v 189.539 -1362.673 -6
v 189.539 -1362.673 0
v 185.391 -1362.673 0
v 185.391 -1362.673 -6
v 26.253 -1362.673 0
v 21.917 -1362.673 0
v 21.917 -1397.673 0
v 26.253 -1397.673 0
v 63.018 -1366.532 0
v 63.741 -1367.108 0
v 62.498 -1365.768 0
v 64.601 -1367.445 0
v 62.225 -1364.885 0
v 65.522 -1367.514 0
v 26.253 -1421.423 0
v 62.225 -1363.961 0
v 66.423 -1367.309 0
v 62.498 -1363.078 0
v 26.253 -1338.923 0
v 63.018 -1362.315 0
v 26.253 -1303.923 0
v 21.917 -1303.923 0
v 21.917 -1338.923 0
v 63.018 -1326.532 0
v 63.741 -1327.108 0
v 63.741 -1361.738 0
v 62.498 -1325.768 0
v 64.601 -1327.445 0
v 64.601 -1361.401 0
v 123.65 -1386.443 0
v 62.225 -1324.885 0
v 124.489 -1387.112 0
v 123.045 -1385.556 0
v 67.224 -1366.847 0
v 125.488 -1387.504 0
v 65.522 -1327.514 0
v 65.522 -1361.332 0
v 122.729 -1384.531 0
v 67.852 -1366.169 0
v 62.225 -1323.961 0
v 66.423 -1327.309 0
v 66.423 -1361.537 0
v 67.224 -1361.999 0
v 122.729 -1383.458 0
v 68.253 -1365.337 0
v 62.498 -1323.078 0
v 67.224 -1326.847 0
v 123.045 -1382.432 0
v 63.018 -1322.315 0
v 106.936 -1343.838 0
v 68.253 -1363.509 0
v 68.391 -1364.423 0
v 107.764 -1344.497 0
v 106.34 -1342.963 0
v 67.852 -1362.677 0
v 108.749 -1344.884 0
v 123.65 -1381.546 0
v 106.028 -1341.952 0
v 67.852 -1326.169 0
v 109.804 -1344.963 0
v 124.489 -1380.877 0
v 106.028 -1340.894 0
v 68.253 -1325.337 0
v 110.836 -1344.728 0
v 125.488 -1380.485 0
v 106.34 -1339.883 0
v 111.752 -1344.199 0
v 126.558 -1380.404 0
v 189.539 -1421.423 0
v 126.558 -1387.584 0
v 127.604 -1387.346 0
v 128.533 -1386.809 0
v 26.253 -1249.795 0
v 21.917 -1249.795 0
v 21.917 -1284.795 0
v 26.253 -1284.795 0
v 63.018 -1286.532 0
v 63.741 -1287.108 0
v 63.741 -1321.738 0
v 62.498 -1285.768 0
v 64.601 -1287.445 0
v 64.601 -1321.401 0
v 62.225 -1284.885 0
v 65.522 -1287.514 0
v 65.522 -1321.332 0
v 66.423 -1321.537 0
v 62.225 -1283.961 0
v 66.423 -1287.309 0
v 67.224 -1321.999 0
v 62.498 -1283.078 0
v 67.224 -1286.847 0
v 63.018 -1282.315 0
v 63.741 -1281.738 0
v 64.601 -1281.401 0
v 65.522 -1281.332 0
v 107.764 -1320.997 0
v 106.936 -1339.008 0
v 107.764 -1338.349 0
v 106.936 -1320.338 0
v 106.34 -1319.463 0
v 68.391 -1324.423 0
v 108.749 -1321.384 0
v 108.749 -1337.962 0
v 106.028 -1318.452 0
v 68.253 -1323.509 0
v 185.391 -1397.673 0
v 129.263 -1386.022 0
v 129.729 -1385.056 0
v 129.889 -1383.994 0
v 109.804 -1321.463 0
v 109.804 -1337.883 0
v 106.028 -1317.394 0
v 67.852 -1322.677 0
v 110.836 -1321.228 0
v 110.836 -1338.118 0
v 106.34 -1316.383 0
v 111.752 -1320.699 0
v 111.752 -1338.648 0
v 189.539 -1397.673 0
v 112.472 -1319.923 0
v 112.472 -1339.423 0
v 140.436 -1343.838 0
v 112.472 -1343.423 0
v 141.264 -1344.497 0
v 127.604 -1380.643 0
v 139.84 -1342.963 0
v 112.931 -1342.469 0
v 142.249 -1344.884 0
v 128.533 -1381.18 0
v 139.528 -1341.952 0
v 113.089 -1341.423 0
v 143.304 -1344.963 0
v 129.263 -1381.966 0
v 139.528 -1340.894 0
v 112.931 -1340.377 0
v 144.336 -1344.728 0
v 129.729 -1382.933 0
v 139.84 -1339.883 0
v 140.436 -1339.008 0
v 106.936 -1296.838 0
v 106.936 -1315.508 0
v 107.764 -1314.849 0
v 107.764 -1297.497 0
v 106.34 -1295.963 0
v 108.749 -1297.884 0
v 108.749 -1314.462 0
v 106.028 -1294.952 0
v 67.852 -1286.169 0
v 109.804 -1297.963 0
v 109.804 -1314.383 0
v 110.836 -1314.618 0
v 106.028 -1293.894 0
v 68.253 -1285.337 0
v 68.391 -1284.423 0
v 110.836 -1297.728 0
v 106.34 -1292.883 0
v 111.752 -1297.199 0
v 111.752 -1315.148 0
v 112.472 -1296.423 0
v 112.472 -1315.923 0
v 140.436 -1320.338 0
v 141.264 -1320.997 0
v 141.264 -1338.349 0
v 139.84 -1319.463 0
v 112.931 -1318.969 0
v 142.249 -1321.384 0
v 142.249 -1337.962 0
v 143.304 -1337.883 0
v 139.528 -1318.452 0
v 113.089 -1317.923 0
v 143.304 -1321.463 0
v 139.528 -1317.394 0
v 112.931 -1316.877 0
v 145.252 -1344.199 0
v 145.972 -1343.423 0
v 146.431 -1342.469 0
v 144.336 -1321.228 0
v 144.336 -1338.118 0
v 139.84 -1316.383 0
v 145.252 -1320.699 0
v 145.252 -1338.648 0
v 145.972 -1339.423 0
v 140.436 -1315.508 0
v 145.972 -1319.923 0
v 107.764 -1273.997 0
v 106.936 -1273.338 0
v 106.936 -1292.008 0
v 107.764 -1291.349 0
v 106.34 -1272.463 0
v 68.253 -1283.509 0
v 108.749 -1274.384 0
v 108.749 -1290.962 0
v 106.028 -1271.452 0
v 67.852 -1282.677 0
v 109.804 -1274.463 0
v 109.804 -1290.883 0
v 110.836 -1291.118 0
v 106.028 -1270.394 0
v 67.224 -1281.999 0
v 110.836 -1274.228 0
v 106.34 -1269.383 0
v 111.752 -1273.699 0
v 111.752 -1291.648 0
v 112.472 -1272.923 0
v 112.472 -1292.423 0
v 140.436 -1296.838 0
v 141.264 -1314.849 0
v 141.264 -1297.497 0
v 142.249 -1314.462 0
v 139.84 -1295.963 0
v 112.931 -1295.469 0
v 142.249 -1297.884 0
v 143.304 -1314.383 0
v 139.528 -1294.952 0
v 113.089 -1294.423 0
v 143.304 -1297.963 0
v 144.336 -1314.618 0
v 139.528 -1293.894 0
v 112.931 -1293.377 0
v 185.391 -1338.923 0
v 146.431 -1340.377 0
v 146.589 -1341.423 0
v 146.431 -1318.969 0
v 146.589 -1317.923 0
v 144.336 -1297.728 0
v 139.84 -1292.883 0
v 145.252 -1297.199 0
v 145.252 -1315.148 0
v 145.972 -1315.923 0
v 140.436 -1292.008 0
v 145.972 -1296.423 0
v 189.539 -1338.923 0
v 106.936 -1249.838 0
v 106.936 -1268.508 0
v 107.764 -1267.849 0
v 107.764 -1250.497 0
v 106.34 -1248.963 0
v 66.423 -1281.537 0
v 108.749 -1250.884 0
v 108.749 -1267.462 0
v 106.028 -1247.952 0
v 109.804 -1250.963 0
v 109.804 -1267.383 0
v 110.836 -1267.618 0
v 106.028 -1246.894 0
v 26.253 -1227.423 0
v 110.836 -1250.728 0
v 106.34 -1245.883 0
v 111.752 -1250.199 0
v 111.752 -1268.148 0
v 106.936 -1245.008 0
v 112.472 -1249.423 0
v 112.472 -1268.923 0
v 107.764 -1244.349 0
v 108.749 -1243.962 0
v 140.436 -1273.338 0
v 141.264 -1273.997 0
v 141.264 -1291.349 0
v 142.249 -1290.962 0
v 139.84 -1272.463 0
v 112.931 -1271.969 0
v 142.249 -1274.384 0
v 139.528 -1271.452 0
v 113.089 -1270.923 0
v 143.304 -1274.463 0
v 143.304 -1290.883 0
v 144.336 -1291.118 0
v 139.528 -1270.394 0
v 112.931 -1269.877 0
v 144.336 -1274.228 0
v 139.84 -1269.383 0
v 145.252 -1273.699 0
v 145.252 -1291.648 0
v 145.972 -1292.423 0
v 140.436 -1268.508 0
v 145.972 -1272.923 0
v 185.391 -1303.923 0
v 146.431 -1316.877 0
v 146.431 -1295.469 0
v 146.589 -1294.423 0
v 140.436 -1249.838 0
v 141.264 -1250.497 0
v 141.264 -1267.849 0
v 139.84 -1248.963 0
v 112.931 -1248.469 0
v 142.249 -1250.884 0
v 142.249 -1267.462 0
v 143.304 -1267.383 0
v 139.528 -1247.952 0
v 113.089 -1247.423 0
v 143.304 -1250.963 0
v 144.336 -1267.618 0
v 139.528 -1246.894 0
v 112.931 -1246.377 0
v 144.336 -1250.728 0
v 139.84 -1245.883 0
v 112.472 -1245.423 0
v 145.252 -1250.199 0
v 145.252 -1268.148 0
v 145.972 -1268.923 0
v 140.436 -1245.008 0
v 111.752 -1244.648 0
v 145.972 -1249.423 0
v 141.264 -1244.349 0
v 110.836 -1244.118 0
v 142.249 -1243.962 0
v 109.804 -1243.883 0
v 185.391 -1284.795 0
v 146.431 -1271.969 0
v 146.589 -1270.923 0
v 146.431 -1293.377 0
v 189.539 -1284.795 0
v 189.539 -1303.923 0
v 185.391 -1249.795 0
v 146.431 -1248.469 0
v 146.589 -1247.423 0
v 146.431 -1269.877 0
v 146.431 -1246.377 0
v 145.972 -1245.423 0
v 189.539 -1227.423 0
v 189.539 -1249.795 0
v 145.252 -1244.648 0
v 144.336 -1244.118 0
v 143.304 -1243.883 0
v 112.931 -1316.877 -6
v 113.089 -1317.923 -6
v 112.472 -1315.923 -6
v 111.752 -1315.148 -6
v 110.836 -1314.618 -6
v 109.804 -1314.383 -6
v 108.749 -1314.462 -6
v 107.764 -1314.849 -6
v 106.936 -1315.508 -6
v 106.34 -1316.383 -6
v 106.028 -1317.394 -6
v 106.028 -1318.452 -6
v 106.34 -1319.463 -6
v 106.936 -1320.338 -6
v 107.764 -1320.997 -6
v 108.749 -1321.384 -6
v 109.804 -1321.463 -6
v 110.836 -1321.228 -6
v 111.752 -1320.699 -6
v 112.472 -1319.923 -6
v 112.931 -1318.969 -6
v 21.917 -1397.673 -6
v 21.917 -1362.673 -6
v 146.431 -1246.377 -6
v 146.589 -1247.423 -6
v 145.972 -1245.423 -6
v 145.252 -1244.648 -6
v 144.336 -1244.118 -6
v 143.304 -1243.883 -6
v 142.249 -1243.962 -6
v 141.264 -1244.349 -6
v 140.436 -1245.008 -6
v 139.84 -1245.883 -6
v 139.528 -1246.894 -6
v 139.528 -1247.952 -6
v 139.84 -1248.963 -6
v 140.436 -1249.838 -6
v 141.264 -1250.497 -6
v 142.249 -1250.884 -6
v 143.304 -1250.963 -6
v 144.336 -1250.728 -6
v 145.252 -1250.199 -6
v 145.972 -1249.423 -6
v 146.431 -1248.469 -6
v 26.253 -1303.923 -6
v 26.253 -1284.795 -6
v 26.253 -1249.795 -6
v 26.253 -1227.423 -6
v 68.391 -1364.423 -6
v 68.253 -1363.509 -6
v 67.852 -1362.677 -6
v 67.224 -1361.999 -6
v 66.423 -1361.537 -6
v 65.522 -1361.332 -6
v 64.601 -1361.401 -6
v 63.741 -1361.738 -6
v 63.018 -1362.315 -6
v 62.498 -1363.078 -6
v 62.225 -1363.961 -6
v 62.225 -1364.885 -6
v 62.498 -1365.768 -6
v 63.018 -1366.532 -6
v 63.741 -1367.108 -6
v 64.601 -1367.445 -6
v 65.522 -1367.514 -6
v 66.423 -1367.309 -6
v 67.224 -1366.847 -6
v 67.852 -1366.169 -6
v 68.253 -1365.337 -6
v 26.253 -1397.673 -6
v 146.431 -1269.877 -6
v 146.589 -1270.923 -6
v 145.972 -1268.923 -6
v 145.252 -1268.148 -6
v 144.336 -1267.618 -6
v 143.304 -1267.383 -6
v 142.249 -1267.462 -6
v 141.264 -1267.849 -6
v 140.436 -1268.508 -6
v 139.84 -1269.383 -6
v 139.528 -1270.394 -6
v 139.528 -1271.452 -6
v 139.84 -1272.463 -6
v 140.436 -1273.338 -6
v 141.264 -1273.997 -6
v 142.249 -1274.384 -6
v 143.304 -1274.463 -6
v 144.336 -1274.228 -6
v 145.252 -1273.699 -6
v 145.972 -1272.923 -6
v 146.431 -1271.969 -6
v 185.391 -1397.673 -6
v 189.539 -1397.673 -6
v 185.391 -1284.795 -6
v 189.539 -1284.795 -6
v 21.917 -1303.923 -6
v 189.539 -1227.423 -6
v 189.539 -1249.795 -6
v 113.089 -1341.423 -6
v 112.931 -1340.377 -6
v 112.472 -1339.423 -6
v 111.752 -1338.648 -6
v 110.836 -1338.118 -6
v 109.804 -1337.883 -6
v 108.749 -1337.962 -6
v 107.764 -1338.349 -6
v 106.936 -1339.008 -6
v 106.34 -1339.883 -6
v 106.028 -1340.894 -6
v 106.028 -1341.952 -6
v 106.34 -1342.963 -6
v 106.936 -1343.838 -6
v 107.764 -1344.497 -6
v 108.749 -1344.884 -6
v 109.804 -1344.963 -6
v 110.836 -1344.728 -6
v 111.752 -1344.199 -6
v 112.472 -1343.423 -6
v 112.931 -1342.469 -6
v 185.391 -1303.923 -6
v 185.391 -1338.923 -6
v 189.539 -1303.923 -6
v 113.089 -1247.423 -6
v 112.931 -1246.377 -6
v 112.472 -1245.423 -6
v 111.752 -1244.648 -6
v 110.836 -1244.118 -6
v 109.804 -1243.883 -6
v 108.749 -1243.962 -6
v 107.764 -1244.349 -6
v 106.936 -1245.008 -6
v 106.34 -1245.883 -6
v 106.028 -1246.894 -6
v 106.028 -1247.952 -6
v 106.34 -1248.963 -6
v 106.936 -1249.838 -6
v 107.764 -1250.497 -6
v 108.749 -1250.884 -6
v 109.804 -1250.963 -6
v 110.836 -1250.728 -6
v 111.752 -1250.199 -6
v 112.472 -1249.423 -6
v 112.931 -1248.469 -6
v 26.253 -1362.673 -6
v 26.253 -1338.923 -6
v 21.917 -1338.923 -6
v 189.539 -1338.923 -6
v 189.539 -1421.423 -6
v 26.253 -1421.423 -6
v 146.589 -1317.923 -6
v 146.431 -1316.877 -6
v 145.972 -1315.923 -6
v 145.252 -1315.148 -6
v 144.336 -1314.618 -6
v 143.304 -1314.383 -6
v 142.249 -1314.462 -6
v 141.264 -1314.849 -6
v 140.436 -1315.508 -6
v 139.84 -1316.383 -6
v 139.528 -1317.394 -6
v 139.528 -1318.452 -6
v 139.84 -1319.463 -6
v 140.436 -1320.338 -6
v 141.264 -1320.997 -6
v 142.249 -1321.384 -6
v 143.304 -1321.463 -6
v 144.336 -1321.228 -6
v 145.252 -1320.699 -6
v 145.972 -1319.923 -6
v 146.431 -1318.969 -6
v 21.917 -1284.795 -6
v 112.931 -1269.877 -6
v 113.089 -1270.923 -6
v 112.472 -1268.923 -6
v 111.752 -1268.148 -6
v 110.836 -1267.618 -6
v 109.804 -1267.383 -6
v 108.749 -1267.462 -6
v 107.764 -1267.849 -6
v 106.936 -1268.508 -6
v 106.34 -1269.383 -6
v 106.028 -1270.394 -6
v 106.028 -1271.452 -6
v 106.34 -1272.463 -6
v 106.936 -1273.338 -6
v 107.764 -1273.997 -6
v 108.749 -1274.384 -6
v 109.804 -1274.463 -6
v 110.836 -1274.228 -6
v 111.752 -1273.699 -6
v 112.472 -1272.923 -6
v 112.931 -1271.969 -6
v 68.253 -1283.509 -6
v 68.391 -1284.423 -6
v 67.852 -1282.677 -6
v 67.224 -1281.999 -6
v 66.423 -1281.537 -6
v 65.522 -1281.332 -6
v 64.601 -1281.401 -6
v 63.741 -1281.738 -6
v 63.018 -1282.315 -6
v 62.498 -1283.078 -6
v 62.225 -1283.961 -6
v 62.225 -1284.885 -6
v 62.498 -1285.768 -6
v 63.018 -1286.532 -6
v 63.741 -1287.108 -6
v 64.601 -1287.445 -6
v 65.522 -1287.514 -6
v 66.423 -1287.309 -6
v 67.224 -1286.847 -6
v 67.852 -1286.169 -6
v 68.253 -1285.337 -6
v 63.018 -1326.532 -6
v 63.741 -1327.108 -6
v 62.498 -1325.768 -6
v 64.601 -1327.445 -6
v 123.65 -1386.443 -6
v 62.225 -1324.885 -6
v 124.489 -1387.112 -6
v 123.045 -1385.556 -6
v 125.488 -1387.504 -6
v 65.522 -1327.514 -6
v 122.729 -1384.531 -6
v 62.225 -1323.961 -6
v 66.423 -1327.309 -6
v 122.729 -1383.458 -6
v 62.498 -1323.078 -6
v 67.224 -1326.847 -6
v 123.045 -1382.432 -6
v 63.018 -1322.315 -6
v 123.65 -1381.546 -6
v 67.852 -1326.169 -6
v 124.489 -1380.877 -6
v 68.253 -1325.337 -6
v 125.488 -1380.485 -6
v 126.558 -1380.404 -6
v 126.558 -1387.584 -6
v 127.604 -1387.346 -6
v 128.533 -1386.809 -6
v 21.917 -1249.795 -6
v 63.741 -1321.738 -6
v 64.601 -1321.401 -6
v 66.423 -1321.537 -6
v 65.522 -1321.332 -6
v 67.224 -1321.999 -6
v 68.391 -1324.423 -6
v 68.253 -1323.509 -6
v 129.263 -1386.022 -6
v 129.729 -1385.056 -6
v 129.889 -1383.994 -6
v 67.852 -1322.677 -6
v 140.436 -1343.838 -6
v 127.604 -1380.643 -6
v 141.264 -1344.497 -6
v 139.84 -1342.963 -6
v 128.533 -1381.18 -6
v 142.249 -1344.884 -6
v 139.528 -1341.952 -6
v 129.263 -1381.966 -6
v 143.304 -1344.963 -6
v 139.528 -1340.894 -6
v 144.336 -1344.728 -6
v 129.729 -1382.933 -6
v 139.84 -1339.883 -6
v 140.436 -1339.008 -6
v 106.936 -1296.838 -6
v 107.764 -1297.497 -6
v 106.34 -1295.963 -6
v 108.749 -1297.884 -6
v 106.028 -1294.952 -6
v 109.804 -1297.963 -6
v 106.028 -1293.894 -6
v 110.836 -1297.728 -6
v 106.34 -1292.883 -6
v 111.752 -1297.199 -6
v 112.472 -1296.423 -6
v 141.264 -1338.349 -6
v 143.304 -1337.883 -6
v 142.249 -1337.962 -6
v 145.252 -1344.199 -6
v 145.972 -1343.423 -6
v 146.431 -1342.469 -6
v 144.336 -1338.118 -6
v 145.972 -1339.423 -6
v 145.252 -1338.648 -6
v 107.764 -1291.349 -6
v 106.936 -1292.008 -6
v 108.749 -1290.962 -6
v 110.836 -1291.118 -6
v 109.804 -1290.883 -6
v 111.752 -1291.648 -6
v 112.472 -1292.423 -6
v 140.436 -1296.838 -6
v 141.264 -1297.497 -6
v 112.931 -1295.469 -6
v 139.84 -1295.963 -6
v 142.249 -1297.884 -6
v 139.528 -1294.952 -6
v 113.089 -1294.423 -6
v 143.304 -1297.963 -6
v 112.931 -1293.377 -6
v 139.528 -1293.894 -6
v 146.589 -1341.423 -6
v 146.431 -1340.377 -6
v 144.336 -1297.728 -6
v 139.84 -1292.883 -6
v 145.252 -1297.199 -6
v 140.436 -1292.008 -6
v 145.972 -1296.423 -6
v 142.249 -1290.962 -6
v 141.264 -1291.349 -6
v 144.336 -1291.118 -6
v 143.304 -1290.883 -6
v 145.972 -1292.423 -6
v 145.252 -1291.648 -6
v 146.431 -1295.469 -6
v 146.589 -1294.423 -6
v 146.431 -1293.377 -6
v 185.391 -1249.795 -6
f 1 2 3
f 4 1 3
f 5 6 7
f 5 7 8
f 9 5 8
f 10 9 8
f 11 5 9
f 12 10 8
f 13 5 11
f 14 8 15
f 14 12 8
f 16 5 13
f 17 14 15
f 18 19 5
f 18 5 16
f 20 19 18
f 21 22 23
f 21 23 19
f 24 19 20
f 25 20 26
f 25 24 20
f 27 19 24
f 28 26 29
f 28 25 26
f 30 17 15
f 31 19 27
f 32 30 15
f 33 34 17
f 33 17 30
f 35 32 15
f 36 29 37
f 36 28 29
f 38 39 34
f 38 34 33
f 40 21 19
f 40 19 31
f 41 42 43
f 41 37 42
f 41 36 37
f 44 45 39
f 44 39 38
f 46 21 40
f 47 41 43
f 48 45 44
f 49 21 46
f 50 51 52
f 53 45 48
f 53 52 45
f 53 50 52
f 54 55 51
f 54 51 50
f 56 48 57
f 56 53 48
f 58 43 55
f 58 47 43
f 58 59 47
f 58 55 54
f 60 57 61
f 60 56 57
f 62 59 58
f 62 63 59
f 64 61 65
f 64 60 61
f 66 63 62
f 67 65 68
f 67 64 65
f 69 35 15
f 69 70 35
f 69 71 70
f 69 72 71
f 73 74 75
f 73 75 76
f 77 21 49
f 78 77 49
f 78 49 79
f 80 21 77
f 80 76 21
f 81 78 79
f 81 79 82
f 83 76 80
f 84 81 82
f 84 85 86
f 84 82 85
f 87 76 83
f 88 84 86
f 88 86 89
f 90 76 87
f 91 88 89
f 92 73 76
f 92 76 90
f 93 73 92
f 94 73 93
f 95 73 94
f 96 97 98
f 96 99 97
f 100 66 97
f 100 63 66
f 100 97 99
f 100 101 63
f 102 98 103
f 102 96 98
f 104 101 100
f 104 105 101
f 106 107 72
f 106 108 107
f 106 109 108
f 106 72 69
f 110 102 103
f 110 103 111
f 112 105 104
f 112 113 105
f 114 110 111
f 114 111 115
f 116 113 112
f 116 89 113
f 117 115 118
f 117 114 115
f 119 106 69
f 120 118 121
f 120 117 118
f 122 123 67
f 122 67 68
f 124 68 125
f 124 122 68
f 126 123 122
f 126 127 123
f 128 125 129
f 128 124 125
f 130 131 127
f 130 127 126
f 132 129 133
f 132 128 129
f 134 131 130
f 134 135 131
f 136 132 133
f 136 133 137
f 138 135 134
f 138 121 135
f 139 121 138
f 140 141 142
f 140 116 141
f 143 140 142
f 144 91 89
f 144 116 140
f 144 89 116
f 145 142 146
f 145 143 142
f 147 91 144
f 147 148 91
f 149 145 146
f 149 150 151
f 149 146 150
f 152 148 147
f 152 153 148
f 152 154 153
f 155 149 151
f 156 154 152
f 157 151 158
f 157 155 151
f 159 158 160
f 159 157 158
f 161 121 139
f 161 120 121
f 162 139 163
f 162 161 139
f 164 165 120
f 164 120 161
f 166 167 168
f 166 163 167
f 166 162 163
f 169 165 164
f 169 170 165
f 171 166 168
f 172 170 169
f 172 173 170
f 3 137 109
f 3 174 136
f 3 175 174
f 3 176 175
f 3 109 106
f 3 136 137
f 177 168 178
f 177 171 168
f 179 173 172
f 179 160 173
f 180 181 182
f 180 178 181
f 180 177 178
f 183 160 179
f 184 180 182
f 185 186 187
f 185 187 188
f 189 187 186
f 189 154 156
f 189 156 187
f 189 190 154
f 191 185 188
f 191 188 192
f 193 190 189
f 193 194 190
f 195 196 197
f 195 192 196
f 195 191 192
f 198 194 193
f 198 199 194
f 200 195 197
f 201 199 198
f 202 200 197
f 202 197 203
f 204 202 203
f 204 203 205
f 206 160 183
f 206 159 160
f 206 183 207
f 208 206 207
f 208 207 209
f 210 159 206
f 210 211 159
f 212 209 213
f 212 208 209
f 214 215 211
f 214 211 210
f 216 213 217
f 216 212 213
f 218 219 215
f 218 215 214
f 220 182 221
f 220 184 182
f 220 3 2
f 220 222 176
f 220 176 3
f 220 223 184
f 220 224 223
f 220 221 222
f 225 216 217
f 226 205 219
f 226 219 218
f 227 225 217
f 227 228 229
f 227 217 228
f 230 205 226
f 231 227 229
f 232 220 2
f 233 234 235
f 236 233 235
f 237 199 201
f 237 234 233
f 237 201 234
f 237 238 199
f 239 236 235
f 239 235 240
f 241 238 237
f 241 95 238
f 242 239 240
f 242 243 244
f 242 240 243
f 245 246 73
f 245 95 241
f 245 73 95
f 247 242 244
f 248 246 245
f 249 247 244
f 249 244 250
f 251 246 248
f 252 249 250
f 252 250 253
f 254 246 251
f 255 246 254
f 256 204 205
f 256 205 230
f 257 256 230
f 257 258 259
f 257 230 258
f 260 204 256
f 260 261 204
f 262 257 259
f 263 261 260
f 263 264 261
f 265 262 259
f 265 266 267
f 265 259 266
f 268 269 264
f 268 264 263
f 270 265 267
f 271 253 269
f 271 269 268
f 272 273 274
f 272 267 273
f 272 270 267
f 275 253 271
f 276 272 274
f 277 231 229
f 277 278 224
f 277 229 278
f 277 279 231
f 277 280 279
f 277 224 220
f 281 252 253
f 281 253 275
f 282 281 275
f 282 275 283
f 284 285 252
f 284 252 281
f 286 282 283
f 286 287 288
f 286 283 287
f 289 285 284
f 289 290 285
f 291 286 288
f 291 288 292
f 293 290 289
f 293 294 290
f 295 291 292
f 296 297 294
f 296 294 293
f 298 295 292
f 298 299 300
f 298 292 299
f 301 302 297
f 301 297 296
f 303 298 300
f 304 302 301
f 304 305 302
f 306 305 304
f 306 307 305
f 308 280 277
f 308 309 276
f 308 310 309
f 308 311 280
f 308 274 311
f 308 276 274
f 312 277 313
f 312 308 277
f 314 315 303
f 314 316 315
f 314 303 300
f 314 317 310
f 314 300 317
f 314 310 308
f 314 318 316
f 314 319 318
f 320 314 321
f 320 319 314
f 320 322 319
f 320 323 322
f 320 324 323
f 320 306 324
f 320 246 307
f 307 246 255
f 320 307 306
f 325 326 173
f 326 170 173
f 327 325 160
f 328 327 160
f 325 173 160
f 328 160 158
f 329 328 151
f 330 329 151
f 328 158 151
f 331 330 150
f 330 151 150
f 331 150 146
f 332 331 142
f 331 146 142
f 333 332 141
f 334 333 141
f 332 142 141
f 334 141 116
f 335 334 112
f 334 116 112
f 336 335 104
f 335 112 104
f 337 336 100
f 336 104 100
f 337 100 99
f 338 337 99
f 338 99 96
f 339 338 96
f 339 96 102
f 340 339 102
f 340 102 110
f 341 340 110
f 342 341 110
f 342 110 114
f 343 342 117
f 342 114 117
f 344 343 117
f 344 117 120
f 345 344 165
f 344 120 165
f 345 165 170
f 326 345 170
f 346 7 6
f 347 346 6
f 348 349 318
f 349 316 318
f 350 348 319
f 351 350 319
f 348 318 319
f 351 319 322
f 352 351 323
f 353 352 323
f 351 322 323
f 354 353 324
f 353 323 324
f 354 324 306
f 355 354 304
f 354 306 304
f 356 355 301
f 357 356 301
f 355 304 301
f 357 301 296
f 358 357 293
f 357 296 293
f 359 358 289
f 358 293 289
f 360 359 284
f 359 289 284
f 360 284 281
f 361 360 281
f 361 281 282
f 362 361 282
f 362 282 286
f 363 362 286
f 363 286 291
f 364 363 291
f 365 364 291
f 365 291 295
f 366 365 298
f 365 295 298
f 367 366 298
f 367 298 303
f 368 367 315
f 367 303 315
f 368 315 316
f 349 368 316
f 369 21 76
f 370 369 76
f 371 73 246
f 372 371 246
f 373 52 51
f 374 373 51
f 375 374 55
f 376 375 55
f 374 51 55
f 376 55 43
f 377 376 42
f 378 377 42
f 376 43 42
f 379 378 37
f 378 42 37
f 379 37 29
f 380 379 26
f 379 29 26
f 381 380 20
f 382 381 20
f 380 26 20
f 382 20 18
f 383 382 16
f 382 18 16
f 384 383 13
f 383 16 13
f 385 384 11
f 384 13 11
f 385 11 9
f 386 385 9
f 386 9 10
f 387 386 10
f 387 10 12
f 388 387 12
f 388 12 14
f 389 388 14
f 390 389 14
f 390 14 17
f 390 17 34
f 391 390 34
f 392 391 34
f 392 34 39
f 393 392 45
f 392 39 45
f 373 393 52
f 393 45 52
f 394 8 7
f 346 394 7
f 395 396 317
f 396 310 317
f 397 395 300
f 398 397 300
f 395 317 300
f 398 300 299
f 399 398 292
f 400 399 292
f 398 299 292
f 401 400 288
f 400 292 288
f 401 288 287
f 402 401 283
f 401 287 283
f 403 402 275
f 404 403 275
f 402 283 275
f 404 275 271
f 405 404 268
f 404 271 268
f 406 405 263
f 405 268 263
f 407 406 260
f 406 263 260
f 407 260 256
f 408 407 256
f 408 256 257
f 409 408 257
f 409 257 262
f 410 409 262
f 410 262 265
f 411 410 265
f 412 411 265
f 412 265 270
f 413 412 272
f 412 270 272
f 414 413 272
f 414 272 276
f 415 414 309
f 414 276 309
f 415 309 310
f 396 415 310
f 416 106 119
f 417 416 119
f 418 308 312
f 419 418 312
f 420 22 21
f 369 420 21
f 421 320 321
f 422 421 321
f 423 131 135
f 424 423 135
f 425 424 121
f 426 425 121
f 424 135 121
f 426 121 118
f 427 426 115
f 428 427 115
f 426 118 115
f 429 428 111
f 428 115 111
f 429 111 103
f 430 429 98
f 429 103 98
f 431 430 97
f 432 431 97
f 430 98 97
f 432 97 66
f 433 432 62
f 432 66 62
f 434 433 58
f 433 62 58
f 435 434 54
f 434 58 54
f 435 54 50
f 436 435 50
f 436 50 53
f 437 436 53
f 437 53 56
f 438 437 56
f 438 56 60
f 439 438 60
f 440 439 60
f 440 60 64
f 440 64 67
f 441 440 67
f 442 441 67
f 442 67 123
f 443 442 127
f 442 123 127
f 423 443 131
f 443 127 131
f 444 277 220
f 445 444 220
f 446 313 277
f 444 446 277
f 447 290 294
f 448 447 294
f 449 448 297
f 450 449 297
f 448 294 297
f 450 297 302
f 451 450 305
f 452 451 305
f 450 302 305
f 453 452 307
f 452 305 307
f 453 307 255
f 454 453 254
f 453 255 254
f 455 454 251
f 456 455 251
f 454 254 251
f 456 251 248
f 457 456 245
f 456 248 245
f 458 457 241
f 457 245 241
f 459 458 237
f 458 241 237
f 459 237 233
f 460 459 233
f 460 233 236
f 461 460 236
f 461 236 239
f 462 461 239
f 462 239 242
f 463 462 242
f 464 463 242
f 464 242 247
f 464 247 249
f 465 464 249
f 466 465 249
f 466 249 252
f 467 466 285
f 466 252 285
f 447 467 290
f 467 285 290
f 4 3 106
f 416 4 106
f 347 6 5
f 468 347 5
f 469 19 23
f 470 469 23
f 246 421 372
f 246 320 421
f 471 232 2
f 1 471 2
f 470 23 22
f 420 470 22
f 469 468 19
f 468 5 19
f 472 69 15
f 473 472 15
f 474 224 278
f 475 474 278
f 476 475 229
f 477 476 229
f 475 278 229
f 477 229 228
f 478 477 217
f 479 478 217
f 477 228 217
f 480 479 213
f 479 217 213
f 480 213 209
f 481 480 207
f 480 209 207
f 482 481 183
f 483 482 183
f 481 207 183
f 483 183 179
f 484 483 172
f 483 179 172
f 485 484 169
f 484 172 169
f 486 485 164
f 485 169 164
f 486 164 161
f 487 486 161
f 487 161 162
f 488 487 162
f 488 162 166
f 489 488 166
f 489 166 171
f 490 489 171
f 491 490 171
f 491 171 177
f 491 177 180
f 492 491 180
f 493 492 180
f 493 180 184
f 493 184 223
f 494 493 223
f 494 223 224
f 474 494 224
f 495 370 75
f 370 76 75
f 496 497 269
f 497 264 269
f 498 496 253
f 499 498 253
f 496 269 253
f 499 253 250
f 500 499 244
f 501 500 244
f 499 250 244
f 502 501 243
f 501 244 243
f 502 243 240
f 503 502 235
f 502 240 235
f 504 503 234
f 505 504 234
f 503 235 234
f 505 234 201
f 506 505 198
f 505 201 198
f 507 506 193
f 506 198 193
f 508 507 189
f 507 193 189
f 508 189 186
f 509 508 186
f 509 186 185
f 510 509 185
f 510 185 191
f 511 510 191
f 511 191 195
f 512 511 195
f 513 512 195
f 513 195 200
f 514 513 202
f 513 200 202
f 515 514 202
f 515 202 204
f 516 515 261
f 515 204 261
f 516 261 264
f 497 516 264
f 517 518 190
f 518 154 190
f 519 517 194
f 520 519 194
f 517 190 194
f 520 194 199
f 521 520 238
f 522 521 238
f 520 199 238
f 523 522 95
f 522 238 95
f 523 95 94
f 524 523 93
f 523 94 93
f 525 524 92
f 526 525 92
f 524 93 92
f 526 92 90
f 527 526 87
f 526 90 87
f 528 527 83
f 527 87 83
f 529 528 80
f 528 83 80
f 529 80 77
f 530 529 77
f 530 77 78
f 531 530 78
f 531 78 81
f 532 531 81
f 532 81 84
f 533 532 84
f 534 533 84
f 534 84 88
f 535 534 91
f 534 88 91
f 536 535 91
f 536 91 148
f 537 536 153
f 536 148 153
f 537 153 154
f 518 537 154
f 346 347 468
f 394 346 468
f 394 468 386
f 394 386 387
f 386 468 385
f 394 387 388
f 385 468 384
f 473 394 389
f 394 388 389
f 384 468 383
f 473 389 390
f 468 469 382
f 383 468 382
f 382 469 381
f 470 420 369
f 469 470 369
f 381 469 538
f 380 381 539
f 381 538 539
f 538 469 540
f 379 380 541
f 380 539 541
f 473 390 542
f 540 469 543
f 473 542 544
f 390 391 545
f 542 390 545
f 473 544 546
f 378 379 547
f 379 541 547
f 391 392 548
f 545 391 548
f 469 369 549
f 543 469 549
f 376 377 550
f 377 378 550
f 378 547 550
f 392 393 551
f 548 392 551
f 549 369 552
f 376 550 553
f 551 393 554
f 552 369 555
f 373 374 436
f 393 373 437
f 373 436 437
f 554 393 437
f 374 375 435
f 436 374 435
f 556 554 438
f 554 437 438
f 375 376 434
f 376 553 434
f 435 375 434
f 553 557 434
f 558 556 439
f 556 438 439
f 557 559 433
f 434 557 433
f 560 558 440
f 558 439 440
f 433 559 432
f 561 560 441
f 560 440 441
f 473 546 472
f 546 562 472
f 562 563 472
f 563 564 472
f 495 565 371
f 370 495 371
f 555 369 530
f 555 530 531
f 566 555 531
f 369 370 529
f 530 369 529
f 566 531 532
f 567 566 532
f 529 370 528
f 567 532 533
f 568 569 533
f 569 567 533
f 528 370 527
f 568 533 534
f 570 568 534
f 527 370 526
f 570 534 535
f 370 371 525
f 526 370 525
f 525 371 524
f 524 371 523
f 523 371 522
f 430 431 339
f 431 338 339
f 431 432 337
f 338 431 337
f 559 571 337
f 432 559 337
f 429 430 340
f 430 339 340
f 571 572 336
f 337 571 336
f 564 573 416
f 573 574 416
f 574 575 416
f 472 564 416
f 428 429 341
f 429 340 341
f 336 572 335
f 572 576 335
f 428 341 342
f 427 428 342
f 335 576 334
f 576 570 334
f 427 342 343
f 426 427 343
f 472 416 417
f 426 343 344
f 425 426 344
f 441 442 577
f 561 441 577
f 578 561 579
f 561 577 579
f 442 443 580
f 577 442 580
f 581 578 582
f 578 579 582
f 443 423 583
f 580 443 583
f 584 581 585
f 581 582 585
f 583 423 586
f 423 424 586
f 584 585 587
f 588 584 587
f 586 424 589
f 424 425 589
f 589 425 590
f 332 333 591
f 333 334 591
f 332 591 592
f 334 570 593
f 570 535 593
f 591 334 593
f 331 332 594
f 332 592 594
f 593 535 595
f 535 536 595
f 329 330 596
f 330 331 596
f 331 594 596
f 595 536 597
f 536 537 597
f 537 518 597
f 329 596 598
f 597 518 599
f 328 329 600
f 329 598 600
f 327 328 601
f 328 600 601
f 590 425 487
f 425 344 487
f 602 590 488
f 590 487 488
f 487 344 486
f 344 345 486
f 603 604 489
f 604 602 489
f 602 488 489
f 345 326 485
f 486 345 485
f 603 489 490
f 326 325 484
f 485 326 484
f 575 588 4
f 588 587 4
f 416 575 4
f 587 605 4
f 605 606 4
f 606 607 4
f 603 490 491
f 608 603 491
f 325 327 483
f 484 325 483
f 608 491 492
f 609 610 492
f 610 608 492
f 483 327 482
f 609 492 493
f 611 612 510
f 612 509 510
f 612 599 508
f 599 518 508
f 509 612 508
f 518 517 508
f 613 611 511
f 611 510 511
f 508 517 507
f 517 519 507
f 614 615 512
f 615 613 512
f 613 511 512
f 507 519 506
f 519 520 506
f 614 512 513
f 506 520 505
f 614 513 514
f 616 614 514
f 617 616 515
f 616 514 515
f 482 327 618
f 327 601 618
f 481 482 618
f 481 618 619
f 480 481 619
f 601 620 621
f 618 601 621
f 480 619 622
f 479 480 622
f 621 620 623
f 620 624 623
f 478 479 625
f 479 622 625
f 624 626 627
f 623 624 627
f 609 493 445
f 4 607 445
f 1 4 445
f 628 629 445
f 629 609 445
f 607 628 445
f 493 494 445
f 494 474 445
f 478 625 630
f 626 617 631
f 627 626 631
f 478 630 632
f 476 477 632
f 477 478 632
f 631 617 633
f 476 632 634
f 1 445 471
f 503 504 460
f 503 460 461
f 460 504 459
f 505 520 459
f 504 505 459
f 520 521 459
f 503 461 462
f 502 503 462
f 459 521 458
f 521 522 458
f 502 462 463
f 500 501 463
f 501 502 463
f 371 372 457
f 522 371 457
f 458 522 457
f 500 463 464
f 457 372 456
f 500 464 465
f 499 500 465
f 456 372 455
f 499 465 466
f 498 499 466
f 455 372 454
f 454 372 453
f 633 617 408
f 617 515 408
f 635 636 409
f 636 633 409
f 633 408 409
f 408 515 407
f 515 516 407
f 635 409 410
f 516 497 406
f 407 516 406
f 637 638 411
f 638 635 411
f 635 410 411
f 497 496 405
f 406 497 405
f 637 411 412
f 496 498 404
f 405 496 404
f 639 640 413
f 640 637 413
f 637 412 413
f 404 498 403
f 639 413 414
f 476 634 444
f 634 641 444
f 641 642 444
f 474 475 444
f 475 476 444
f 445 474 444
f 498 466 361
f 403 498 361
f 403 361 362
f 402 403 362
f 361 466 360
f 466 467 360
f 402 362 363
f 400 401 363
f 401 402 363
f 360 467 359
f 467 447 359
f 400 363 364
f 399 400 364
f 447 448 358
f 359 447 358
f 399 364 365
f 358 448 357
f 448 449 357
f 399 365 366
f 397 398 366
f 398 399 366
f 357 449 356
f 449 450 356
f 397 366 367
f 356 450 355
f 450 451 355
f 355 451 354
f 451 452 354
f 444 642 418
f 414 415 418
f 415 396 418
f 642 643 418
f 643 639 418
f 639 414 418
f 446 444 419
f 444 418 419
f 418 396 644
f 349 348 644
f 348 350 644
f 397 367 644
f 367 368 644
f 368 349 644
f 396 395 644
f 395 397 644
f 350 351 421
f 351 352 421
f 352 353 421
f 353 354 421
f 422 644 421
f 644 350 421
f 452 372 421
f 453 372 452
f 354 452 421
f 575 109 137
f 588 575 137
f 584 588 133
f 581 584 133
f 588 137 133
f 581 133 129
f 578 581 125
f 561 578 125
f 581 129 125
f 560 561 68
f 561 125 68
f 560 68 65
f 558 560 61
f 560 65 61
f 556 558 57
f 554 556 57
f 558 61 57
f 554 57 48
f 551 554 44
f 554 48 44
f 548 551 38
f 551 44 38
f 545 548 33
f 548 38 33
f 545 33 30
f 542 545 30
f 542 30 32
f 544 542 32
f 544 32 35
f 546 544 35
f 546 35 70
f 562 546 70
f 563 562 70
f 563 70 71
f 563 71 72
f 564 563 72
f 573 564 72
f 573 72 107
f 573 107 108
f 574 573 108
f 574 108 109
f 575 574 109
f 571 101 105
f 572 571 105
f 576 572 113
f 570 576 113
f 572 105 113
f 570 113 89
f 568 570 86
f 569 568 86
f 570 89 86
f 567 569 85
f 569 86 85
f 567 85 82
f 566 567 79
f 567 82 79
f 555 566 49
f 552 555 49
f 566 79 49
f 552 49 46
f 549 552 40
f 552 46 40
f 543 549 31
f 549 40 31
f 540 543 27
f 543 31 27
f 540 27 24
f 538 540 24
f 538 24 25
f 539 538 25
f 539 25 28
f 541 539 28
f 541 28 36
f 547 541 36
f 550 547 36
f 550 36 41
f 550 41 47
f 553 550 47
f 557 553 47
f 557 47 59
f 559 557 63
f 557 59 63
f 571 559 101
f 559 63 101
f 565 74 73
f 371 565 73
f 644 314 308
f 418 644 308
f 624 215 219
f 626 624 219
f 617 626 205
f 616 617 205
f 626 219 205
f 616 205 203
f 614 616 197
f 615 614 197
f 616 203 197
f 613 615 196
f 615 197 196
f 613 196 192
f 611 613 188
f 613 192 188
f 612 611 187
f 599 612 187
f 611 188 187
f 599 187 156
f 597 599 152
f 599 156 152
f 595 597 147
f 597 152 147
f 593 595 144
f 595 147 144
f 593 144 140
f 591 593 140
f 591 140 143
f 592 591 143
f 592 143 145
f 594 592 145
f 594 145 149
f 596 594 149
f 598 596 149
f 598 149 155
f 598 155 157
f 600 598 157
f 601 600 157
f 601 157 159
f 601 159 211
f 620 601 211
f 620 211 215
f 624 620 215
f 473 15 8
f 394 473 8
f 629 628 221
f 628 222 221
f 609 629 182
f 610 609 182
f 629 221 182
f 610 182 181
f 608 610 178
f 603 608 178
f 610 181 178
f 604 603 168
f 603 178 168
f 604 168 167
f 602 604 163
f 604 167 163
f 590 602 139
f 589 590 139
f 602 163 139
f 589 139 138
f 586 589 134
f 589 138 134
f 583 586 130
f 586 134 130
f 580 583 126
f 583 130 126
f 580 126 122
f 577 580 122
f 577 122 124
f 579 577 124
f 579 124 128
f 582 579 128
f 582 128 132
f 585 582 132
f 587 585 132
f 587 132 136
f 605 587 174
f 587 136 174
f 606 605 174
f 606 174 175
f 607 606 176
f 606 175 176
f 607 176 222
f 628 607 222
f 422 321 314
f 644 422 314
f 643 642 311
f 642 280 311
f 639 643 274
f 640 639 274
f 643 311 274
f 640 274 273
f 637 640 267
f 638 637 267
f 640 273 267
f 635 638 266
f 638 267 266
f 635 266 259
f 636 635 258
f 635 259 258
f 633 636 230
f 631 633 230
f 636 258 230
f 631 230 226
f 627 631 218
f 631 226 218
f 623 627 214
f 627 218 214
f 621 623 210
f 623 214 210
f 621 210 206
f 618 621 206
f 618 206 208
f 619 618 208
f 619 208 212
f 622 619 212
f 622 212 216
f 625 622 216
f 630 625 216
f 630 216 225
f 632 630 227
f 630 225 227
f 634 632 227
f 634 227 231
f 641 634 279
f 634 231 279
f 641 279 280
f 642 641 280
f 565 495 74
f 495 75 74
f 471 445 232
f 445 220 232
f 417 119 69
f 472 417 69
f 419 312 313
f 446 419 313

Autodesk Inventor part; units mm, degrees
ref_plane "YZ Plane" through (0, 0, 0) normal (1, 0, 0) x (0, 1, 0)
ref_plane "XZ Plane" through (0, 0, 0) normal (0, 1, 0) x (-1, 0, 0)
ref_plane "XY Plane" through (0, 0, 0) normal (0, 0, 1) x (1, 0, 0)
sketch "Sketch1" plane through (0, 0, 0) normal (0, 0, 1) x (1, 0, 0)
  line L0 (189.5387, -1221.4231) -> (189.5387, -1249.7948) projected
  line L1 (189.5387, -1249.7948) -> (185.3914, -1249.7948) projected
  line L2 (185.3914, -1227.4231) -> (26.2531, -1227.4231) projected
  line L3 (189.5387, -1227.4231) -> (185.3914, -1227.4231) projected
  line L4 (185.3914, -1249.7948) -> (185.3914, -1284.7948) projected
  line L5 (185.3914, -1284.7948) -> (189.5387, -1284.7948) projected
  line L6 (189.5387, -1284.7948) -> (189.5387, -1303.9231) projected
  line L7 (189.5387, -1303.9231) -> (185.3914, -1303.9231) projected
  line L8 (185.3914, -1303.9231) -> (185.3914, -1338.9231) projected
  line L9 (189.5387, -1338.9231) -> (189.5387, -1362.6731) projected
  line L10 (185.3914, -1338.9231) -> (189.5387, -1338.9231) projected
  line L11 (189.5387, -1362.6731) -> (185.3914, -1362.6731) projected
  line L12 (185.3914, -1362.6731) -> (185.3914, -1397.6731) projected
  line L13 (185.3914, -1397.6731) -> (189.5387, -1397.6731) projected
  line L14 (189.5387, -1397.6731) -> (189.5387, -1421.4231) projected
  line L15 (189.5387, -1421.4231) -> (185.3914, -1421.4231) projected
  line L16 (185.3914, -1421.4231) -> (26.2531, -1421.4231) projected
  line L17 (26.2531, -1415.4231) -> (26.2531, -1421.4231) projected
  line L18 (26.2531, -1421.4231) -> (26.2531, -1397.6731) projected
  line L19 (26.2531, -1397.6731) -> (21.9172, -1397.6731) projected
  line L20 (21.9172, -1397.6731) -> (21.9172, -1362.6731) projected
  line L21 (21.9172, -1362.6731) -> (26.2531, -1362.6731) projected
  line L22 (26.2531, -1362.6731) -> (26.2531, -1338.9231) projected
  line L23 (26.2531, -1338.9231) -> (21.9172, -1338.9231) projected
  line L24 (21.9172, -1338.9231) -> (21.9172, -1303.9231) projected
  line L25 (21.9172, -1303.9231) -> (26.2531, -1303.9231) projected
  line L26 (26.2531, -1303.9231) -> (26.2531, -1284.7948) projected
  line L27 (26.2531, -1284.7948) -> (21.9172, -1284.7948) projected
  line L28 (21.9172, -1284.7948) -> (21.9172, -1249.7948) projected
  line L29 (21.9172, -1249.7948) -> (26.2531, -1249.7948) projected
  line L30 (26.2531, -1249.7948) -> (26.2531, -1221.4231) projected
  line L31 (-159.1383, -1249.7948) -> (-159.1383, -1221.4231)
  point P0 (0, 0)
extrude "Extrusion1" add sketch "Sketch1" against normal blind 6
sketch "Sketch2" plane through (0, 0, 0) normal (0, 0, 1) x (1, 0, 0)
  circle A0 centre (109.5387, -1341.4231) radius 3.55
  line L0 (26.2531, -1421.4231) -> (189.5387, -1421.4231) projected
  line L1 (21.9172, -1362.6731) -> (21.9172, -1397.6731) projected
  line L2 (189.5387, -1421.4231) -> (189.5387, -1397.6731) projected
  point P0 (0, 0)
  dimension "d2" = 7.1
  dimension "d3" = 80
  dimension "d13" = 80
extrude "Extrusion2" cut sketch "Sketch2" against normal through all
pattern_linear "Rectangular Pattern1" count 5 spacing 23.5 along (0, 1, 0) count 2 spacing 33.5 along (1, 0, 0) of "Extrusion2"
sketch "Sketch3" plane through (0, 0, 0) normal (0, 0, 1) x (1, 0, 0)
  circle A0 centre (143.0387, -1341.4231) radius 3.55 construction
  circle A1 centre (109.5387, -1341.4231) radius 3.55 construction
  line L0 (143.0387, -1341.4231) -> (109.5387, -1341.4231) construction
  line L1 (126.2887, -1341.4231) -> (126.2887, -1398.6918) construction
  circle A2 centre (126.2887, -1383.9944) radius 3.6
  point P0 (0, 0)
  dimension "d14" = 7.2
extrude "Extrusion3" cut sketch "Sketch3" against normal through all
sketch "Sketch4" plane through (0, 0, 0) normal (0, 0, 1) x (1, 0, 0)
  circle A0 centre (65.2908, -1284.4231) radius 3.1
  line L0 (189.5387, -1227.4231) -> (26.2531, -1227.4231) projected
  circle A1 centre (65.2908, -1324.4231) radius 3.1
  circle A2 centre (65.2908, -1364.4231) radius 3.1
  line L1 (26.2531, -1421.4231) -> (189.5387, -1421.4231) projected
  point P0 (0, 0)
  dimension "d17" = 6.2
  dimension "d18" = 57
  dimension "d19" = 6.2
  dimension "d20" = 6.2
  dimension "d21" = 40
  dimension "d22" = 40
  dimension "d23" = 57
extrude "Extrusion4" cut sketch "Sketch4" against normal through all
properties part number "Frontpanel"
